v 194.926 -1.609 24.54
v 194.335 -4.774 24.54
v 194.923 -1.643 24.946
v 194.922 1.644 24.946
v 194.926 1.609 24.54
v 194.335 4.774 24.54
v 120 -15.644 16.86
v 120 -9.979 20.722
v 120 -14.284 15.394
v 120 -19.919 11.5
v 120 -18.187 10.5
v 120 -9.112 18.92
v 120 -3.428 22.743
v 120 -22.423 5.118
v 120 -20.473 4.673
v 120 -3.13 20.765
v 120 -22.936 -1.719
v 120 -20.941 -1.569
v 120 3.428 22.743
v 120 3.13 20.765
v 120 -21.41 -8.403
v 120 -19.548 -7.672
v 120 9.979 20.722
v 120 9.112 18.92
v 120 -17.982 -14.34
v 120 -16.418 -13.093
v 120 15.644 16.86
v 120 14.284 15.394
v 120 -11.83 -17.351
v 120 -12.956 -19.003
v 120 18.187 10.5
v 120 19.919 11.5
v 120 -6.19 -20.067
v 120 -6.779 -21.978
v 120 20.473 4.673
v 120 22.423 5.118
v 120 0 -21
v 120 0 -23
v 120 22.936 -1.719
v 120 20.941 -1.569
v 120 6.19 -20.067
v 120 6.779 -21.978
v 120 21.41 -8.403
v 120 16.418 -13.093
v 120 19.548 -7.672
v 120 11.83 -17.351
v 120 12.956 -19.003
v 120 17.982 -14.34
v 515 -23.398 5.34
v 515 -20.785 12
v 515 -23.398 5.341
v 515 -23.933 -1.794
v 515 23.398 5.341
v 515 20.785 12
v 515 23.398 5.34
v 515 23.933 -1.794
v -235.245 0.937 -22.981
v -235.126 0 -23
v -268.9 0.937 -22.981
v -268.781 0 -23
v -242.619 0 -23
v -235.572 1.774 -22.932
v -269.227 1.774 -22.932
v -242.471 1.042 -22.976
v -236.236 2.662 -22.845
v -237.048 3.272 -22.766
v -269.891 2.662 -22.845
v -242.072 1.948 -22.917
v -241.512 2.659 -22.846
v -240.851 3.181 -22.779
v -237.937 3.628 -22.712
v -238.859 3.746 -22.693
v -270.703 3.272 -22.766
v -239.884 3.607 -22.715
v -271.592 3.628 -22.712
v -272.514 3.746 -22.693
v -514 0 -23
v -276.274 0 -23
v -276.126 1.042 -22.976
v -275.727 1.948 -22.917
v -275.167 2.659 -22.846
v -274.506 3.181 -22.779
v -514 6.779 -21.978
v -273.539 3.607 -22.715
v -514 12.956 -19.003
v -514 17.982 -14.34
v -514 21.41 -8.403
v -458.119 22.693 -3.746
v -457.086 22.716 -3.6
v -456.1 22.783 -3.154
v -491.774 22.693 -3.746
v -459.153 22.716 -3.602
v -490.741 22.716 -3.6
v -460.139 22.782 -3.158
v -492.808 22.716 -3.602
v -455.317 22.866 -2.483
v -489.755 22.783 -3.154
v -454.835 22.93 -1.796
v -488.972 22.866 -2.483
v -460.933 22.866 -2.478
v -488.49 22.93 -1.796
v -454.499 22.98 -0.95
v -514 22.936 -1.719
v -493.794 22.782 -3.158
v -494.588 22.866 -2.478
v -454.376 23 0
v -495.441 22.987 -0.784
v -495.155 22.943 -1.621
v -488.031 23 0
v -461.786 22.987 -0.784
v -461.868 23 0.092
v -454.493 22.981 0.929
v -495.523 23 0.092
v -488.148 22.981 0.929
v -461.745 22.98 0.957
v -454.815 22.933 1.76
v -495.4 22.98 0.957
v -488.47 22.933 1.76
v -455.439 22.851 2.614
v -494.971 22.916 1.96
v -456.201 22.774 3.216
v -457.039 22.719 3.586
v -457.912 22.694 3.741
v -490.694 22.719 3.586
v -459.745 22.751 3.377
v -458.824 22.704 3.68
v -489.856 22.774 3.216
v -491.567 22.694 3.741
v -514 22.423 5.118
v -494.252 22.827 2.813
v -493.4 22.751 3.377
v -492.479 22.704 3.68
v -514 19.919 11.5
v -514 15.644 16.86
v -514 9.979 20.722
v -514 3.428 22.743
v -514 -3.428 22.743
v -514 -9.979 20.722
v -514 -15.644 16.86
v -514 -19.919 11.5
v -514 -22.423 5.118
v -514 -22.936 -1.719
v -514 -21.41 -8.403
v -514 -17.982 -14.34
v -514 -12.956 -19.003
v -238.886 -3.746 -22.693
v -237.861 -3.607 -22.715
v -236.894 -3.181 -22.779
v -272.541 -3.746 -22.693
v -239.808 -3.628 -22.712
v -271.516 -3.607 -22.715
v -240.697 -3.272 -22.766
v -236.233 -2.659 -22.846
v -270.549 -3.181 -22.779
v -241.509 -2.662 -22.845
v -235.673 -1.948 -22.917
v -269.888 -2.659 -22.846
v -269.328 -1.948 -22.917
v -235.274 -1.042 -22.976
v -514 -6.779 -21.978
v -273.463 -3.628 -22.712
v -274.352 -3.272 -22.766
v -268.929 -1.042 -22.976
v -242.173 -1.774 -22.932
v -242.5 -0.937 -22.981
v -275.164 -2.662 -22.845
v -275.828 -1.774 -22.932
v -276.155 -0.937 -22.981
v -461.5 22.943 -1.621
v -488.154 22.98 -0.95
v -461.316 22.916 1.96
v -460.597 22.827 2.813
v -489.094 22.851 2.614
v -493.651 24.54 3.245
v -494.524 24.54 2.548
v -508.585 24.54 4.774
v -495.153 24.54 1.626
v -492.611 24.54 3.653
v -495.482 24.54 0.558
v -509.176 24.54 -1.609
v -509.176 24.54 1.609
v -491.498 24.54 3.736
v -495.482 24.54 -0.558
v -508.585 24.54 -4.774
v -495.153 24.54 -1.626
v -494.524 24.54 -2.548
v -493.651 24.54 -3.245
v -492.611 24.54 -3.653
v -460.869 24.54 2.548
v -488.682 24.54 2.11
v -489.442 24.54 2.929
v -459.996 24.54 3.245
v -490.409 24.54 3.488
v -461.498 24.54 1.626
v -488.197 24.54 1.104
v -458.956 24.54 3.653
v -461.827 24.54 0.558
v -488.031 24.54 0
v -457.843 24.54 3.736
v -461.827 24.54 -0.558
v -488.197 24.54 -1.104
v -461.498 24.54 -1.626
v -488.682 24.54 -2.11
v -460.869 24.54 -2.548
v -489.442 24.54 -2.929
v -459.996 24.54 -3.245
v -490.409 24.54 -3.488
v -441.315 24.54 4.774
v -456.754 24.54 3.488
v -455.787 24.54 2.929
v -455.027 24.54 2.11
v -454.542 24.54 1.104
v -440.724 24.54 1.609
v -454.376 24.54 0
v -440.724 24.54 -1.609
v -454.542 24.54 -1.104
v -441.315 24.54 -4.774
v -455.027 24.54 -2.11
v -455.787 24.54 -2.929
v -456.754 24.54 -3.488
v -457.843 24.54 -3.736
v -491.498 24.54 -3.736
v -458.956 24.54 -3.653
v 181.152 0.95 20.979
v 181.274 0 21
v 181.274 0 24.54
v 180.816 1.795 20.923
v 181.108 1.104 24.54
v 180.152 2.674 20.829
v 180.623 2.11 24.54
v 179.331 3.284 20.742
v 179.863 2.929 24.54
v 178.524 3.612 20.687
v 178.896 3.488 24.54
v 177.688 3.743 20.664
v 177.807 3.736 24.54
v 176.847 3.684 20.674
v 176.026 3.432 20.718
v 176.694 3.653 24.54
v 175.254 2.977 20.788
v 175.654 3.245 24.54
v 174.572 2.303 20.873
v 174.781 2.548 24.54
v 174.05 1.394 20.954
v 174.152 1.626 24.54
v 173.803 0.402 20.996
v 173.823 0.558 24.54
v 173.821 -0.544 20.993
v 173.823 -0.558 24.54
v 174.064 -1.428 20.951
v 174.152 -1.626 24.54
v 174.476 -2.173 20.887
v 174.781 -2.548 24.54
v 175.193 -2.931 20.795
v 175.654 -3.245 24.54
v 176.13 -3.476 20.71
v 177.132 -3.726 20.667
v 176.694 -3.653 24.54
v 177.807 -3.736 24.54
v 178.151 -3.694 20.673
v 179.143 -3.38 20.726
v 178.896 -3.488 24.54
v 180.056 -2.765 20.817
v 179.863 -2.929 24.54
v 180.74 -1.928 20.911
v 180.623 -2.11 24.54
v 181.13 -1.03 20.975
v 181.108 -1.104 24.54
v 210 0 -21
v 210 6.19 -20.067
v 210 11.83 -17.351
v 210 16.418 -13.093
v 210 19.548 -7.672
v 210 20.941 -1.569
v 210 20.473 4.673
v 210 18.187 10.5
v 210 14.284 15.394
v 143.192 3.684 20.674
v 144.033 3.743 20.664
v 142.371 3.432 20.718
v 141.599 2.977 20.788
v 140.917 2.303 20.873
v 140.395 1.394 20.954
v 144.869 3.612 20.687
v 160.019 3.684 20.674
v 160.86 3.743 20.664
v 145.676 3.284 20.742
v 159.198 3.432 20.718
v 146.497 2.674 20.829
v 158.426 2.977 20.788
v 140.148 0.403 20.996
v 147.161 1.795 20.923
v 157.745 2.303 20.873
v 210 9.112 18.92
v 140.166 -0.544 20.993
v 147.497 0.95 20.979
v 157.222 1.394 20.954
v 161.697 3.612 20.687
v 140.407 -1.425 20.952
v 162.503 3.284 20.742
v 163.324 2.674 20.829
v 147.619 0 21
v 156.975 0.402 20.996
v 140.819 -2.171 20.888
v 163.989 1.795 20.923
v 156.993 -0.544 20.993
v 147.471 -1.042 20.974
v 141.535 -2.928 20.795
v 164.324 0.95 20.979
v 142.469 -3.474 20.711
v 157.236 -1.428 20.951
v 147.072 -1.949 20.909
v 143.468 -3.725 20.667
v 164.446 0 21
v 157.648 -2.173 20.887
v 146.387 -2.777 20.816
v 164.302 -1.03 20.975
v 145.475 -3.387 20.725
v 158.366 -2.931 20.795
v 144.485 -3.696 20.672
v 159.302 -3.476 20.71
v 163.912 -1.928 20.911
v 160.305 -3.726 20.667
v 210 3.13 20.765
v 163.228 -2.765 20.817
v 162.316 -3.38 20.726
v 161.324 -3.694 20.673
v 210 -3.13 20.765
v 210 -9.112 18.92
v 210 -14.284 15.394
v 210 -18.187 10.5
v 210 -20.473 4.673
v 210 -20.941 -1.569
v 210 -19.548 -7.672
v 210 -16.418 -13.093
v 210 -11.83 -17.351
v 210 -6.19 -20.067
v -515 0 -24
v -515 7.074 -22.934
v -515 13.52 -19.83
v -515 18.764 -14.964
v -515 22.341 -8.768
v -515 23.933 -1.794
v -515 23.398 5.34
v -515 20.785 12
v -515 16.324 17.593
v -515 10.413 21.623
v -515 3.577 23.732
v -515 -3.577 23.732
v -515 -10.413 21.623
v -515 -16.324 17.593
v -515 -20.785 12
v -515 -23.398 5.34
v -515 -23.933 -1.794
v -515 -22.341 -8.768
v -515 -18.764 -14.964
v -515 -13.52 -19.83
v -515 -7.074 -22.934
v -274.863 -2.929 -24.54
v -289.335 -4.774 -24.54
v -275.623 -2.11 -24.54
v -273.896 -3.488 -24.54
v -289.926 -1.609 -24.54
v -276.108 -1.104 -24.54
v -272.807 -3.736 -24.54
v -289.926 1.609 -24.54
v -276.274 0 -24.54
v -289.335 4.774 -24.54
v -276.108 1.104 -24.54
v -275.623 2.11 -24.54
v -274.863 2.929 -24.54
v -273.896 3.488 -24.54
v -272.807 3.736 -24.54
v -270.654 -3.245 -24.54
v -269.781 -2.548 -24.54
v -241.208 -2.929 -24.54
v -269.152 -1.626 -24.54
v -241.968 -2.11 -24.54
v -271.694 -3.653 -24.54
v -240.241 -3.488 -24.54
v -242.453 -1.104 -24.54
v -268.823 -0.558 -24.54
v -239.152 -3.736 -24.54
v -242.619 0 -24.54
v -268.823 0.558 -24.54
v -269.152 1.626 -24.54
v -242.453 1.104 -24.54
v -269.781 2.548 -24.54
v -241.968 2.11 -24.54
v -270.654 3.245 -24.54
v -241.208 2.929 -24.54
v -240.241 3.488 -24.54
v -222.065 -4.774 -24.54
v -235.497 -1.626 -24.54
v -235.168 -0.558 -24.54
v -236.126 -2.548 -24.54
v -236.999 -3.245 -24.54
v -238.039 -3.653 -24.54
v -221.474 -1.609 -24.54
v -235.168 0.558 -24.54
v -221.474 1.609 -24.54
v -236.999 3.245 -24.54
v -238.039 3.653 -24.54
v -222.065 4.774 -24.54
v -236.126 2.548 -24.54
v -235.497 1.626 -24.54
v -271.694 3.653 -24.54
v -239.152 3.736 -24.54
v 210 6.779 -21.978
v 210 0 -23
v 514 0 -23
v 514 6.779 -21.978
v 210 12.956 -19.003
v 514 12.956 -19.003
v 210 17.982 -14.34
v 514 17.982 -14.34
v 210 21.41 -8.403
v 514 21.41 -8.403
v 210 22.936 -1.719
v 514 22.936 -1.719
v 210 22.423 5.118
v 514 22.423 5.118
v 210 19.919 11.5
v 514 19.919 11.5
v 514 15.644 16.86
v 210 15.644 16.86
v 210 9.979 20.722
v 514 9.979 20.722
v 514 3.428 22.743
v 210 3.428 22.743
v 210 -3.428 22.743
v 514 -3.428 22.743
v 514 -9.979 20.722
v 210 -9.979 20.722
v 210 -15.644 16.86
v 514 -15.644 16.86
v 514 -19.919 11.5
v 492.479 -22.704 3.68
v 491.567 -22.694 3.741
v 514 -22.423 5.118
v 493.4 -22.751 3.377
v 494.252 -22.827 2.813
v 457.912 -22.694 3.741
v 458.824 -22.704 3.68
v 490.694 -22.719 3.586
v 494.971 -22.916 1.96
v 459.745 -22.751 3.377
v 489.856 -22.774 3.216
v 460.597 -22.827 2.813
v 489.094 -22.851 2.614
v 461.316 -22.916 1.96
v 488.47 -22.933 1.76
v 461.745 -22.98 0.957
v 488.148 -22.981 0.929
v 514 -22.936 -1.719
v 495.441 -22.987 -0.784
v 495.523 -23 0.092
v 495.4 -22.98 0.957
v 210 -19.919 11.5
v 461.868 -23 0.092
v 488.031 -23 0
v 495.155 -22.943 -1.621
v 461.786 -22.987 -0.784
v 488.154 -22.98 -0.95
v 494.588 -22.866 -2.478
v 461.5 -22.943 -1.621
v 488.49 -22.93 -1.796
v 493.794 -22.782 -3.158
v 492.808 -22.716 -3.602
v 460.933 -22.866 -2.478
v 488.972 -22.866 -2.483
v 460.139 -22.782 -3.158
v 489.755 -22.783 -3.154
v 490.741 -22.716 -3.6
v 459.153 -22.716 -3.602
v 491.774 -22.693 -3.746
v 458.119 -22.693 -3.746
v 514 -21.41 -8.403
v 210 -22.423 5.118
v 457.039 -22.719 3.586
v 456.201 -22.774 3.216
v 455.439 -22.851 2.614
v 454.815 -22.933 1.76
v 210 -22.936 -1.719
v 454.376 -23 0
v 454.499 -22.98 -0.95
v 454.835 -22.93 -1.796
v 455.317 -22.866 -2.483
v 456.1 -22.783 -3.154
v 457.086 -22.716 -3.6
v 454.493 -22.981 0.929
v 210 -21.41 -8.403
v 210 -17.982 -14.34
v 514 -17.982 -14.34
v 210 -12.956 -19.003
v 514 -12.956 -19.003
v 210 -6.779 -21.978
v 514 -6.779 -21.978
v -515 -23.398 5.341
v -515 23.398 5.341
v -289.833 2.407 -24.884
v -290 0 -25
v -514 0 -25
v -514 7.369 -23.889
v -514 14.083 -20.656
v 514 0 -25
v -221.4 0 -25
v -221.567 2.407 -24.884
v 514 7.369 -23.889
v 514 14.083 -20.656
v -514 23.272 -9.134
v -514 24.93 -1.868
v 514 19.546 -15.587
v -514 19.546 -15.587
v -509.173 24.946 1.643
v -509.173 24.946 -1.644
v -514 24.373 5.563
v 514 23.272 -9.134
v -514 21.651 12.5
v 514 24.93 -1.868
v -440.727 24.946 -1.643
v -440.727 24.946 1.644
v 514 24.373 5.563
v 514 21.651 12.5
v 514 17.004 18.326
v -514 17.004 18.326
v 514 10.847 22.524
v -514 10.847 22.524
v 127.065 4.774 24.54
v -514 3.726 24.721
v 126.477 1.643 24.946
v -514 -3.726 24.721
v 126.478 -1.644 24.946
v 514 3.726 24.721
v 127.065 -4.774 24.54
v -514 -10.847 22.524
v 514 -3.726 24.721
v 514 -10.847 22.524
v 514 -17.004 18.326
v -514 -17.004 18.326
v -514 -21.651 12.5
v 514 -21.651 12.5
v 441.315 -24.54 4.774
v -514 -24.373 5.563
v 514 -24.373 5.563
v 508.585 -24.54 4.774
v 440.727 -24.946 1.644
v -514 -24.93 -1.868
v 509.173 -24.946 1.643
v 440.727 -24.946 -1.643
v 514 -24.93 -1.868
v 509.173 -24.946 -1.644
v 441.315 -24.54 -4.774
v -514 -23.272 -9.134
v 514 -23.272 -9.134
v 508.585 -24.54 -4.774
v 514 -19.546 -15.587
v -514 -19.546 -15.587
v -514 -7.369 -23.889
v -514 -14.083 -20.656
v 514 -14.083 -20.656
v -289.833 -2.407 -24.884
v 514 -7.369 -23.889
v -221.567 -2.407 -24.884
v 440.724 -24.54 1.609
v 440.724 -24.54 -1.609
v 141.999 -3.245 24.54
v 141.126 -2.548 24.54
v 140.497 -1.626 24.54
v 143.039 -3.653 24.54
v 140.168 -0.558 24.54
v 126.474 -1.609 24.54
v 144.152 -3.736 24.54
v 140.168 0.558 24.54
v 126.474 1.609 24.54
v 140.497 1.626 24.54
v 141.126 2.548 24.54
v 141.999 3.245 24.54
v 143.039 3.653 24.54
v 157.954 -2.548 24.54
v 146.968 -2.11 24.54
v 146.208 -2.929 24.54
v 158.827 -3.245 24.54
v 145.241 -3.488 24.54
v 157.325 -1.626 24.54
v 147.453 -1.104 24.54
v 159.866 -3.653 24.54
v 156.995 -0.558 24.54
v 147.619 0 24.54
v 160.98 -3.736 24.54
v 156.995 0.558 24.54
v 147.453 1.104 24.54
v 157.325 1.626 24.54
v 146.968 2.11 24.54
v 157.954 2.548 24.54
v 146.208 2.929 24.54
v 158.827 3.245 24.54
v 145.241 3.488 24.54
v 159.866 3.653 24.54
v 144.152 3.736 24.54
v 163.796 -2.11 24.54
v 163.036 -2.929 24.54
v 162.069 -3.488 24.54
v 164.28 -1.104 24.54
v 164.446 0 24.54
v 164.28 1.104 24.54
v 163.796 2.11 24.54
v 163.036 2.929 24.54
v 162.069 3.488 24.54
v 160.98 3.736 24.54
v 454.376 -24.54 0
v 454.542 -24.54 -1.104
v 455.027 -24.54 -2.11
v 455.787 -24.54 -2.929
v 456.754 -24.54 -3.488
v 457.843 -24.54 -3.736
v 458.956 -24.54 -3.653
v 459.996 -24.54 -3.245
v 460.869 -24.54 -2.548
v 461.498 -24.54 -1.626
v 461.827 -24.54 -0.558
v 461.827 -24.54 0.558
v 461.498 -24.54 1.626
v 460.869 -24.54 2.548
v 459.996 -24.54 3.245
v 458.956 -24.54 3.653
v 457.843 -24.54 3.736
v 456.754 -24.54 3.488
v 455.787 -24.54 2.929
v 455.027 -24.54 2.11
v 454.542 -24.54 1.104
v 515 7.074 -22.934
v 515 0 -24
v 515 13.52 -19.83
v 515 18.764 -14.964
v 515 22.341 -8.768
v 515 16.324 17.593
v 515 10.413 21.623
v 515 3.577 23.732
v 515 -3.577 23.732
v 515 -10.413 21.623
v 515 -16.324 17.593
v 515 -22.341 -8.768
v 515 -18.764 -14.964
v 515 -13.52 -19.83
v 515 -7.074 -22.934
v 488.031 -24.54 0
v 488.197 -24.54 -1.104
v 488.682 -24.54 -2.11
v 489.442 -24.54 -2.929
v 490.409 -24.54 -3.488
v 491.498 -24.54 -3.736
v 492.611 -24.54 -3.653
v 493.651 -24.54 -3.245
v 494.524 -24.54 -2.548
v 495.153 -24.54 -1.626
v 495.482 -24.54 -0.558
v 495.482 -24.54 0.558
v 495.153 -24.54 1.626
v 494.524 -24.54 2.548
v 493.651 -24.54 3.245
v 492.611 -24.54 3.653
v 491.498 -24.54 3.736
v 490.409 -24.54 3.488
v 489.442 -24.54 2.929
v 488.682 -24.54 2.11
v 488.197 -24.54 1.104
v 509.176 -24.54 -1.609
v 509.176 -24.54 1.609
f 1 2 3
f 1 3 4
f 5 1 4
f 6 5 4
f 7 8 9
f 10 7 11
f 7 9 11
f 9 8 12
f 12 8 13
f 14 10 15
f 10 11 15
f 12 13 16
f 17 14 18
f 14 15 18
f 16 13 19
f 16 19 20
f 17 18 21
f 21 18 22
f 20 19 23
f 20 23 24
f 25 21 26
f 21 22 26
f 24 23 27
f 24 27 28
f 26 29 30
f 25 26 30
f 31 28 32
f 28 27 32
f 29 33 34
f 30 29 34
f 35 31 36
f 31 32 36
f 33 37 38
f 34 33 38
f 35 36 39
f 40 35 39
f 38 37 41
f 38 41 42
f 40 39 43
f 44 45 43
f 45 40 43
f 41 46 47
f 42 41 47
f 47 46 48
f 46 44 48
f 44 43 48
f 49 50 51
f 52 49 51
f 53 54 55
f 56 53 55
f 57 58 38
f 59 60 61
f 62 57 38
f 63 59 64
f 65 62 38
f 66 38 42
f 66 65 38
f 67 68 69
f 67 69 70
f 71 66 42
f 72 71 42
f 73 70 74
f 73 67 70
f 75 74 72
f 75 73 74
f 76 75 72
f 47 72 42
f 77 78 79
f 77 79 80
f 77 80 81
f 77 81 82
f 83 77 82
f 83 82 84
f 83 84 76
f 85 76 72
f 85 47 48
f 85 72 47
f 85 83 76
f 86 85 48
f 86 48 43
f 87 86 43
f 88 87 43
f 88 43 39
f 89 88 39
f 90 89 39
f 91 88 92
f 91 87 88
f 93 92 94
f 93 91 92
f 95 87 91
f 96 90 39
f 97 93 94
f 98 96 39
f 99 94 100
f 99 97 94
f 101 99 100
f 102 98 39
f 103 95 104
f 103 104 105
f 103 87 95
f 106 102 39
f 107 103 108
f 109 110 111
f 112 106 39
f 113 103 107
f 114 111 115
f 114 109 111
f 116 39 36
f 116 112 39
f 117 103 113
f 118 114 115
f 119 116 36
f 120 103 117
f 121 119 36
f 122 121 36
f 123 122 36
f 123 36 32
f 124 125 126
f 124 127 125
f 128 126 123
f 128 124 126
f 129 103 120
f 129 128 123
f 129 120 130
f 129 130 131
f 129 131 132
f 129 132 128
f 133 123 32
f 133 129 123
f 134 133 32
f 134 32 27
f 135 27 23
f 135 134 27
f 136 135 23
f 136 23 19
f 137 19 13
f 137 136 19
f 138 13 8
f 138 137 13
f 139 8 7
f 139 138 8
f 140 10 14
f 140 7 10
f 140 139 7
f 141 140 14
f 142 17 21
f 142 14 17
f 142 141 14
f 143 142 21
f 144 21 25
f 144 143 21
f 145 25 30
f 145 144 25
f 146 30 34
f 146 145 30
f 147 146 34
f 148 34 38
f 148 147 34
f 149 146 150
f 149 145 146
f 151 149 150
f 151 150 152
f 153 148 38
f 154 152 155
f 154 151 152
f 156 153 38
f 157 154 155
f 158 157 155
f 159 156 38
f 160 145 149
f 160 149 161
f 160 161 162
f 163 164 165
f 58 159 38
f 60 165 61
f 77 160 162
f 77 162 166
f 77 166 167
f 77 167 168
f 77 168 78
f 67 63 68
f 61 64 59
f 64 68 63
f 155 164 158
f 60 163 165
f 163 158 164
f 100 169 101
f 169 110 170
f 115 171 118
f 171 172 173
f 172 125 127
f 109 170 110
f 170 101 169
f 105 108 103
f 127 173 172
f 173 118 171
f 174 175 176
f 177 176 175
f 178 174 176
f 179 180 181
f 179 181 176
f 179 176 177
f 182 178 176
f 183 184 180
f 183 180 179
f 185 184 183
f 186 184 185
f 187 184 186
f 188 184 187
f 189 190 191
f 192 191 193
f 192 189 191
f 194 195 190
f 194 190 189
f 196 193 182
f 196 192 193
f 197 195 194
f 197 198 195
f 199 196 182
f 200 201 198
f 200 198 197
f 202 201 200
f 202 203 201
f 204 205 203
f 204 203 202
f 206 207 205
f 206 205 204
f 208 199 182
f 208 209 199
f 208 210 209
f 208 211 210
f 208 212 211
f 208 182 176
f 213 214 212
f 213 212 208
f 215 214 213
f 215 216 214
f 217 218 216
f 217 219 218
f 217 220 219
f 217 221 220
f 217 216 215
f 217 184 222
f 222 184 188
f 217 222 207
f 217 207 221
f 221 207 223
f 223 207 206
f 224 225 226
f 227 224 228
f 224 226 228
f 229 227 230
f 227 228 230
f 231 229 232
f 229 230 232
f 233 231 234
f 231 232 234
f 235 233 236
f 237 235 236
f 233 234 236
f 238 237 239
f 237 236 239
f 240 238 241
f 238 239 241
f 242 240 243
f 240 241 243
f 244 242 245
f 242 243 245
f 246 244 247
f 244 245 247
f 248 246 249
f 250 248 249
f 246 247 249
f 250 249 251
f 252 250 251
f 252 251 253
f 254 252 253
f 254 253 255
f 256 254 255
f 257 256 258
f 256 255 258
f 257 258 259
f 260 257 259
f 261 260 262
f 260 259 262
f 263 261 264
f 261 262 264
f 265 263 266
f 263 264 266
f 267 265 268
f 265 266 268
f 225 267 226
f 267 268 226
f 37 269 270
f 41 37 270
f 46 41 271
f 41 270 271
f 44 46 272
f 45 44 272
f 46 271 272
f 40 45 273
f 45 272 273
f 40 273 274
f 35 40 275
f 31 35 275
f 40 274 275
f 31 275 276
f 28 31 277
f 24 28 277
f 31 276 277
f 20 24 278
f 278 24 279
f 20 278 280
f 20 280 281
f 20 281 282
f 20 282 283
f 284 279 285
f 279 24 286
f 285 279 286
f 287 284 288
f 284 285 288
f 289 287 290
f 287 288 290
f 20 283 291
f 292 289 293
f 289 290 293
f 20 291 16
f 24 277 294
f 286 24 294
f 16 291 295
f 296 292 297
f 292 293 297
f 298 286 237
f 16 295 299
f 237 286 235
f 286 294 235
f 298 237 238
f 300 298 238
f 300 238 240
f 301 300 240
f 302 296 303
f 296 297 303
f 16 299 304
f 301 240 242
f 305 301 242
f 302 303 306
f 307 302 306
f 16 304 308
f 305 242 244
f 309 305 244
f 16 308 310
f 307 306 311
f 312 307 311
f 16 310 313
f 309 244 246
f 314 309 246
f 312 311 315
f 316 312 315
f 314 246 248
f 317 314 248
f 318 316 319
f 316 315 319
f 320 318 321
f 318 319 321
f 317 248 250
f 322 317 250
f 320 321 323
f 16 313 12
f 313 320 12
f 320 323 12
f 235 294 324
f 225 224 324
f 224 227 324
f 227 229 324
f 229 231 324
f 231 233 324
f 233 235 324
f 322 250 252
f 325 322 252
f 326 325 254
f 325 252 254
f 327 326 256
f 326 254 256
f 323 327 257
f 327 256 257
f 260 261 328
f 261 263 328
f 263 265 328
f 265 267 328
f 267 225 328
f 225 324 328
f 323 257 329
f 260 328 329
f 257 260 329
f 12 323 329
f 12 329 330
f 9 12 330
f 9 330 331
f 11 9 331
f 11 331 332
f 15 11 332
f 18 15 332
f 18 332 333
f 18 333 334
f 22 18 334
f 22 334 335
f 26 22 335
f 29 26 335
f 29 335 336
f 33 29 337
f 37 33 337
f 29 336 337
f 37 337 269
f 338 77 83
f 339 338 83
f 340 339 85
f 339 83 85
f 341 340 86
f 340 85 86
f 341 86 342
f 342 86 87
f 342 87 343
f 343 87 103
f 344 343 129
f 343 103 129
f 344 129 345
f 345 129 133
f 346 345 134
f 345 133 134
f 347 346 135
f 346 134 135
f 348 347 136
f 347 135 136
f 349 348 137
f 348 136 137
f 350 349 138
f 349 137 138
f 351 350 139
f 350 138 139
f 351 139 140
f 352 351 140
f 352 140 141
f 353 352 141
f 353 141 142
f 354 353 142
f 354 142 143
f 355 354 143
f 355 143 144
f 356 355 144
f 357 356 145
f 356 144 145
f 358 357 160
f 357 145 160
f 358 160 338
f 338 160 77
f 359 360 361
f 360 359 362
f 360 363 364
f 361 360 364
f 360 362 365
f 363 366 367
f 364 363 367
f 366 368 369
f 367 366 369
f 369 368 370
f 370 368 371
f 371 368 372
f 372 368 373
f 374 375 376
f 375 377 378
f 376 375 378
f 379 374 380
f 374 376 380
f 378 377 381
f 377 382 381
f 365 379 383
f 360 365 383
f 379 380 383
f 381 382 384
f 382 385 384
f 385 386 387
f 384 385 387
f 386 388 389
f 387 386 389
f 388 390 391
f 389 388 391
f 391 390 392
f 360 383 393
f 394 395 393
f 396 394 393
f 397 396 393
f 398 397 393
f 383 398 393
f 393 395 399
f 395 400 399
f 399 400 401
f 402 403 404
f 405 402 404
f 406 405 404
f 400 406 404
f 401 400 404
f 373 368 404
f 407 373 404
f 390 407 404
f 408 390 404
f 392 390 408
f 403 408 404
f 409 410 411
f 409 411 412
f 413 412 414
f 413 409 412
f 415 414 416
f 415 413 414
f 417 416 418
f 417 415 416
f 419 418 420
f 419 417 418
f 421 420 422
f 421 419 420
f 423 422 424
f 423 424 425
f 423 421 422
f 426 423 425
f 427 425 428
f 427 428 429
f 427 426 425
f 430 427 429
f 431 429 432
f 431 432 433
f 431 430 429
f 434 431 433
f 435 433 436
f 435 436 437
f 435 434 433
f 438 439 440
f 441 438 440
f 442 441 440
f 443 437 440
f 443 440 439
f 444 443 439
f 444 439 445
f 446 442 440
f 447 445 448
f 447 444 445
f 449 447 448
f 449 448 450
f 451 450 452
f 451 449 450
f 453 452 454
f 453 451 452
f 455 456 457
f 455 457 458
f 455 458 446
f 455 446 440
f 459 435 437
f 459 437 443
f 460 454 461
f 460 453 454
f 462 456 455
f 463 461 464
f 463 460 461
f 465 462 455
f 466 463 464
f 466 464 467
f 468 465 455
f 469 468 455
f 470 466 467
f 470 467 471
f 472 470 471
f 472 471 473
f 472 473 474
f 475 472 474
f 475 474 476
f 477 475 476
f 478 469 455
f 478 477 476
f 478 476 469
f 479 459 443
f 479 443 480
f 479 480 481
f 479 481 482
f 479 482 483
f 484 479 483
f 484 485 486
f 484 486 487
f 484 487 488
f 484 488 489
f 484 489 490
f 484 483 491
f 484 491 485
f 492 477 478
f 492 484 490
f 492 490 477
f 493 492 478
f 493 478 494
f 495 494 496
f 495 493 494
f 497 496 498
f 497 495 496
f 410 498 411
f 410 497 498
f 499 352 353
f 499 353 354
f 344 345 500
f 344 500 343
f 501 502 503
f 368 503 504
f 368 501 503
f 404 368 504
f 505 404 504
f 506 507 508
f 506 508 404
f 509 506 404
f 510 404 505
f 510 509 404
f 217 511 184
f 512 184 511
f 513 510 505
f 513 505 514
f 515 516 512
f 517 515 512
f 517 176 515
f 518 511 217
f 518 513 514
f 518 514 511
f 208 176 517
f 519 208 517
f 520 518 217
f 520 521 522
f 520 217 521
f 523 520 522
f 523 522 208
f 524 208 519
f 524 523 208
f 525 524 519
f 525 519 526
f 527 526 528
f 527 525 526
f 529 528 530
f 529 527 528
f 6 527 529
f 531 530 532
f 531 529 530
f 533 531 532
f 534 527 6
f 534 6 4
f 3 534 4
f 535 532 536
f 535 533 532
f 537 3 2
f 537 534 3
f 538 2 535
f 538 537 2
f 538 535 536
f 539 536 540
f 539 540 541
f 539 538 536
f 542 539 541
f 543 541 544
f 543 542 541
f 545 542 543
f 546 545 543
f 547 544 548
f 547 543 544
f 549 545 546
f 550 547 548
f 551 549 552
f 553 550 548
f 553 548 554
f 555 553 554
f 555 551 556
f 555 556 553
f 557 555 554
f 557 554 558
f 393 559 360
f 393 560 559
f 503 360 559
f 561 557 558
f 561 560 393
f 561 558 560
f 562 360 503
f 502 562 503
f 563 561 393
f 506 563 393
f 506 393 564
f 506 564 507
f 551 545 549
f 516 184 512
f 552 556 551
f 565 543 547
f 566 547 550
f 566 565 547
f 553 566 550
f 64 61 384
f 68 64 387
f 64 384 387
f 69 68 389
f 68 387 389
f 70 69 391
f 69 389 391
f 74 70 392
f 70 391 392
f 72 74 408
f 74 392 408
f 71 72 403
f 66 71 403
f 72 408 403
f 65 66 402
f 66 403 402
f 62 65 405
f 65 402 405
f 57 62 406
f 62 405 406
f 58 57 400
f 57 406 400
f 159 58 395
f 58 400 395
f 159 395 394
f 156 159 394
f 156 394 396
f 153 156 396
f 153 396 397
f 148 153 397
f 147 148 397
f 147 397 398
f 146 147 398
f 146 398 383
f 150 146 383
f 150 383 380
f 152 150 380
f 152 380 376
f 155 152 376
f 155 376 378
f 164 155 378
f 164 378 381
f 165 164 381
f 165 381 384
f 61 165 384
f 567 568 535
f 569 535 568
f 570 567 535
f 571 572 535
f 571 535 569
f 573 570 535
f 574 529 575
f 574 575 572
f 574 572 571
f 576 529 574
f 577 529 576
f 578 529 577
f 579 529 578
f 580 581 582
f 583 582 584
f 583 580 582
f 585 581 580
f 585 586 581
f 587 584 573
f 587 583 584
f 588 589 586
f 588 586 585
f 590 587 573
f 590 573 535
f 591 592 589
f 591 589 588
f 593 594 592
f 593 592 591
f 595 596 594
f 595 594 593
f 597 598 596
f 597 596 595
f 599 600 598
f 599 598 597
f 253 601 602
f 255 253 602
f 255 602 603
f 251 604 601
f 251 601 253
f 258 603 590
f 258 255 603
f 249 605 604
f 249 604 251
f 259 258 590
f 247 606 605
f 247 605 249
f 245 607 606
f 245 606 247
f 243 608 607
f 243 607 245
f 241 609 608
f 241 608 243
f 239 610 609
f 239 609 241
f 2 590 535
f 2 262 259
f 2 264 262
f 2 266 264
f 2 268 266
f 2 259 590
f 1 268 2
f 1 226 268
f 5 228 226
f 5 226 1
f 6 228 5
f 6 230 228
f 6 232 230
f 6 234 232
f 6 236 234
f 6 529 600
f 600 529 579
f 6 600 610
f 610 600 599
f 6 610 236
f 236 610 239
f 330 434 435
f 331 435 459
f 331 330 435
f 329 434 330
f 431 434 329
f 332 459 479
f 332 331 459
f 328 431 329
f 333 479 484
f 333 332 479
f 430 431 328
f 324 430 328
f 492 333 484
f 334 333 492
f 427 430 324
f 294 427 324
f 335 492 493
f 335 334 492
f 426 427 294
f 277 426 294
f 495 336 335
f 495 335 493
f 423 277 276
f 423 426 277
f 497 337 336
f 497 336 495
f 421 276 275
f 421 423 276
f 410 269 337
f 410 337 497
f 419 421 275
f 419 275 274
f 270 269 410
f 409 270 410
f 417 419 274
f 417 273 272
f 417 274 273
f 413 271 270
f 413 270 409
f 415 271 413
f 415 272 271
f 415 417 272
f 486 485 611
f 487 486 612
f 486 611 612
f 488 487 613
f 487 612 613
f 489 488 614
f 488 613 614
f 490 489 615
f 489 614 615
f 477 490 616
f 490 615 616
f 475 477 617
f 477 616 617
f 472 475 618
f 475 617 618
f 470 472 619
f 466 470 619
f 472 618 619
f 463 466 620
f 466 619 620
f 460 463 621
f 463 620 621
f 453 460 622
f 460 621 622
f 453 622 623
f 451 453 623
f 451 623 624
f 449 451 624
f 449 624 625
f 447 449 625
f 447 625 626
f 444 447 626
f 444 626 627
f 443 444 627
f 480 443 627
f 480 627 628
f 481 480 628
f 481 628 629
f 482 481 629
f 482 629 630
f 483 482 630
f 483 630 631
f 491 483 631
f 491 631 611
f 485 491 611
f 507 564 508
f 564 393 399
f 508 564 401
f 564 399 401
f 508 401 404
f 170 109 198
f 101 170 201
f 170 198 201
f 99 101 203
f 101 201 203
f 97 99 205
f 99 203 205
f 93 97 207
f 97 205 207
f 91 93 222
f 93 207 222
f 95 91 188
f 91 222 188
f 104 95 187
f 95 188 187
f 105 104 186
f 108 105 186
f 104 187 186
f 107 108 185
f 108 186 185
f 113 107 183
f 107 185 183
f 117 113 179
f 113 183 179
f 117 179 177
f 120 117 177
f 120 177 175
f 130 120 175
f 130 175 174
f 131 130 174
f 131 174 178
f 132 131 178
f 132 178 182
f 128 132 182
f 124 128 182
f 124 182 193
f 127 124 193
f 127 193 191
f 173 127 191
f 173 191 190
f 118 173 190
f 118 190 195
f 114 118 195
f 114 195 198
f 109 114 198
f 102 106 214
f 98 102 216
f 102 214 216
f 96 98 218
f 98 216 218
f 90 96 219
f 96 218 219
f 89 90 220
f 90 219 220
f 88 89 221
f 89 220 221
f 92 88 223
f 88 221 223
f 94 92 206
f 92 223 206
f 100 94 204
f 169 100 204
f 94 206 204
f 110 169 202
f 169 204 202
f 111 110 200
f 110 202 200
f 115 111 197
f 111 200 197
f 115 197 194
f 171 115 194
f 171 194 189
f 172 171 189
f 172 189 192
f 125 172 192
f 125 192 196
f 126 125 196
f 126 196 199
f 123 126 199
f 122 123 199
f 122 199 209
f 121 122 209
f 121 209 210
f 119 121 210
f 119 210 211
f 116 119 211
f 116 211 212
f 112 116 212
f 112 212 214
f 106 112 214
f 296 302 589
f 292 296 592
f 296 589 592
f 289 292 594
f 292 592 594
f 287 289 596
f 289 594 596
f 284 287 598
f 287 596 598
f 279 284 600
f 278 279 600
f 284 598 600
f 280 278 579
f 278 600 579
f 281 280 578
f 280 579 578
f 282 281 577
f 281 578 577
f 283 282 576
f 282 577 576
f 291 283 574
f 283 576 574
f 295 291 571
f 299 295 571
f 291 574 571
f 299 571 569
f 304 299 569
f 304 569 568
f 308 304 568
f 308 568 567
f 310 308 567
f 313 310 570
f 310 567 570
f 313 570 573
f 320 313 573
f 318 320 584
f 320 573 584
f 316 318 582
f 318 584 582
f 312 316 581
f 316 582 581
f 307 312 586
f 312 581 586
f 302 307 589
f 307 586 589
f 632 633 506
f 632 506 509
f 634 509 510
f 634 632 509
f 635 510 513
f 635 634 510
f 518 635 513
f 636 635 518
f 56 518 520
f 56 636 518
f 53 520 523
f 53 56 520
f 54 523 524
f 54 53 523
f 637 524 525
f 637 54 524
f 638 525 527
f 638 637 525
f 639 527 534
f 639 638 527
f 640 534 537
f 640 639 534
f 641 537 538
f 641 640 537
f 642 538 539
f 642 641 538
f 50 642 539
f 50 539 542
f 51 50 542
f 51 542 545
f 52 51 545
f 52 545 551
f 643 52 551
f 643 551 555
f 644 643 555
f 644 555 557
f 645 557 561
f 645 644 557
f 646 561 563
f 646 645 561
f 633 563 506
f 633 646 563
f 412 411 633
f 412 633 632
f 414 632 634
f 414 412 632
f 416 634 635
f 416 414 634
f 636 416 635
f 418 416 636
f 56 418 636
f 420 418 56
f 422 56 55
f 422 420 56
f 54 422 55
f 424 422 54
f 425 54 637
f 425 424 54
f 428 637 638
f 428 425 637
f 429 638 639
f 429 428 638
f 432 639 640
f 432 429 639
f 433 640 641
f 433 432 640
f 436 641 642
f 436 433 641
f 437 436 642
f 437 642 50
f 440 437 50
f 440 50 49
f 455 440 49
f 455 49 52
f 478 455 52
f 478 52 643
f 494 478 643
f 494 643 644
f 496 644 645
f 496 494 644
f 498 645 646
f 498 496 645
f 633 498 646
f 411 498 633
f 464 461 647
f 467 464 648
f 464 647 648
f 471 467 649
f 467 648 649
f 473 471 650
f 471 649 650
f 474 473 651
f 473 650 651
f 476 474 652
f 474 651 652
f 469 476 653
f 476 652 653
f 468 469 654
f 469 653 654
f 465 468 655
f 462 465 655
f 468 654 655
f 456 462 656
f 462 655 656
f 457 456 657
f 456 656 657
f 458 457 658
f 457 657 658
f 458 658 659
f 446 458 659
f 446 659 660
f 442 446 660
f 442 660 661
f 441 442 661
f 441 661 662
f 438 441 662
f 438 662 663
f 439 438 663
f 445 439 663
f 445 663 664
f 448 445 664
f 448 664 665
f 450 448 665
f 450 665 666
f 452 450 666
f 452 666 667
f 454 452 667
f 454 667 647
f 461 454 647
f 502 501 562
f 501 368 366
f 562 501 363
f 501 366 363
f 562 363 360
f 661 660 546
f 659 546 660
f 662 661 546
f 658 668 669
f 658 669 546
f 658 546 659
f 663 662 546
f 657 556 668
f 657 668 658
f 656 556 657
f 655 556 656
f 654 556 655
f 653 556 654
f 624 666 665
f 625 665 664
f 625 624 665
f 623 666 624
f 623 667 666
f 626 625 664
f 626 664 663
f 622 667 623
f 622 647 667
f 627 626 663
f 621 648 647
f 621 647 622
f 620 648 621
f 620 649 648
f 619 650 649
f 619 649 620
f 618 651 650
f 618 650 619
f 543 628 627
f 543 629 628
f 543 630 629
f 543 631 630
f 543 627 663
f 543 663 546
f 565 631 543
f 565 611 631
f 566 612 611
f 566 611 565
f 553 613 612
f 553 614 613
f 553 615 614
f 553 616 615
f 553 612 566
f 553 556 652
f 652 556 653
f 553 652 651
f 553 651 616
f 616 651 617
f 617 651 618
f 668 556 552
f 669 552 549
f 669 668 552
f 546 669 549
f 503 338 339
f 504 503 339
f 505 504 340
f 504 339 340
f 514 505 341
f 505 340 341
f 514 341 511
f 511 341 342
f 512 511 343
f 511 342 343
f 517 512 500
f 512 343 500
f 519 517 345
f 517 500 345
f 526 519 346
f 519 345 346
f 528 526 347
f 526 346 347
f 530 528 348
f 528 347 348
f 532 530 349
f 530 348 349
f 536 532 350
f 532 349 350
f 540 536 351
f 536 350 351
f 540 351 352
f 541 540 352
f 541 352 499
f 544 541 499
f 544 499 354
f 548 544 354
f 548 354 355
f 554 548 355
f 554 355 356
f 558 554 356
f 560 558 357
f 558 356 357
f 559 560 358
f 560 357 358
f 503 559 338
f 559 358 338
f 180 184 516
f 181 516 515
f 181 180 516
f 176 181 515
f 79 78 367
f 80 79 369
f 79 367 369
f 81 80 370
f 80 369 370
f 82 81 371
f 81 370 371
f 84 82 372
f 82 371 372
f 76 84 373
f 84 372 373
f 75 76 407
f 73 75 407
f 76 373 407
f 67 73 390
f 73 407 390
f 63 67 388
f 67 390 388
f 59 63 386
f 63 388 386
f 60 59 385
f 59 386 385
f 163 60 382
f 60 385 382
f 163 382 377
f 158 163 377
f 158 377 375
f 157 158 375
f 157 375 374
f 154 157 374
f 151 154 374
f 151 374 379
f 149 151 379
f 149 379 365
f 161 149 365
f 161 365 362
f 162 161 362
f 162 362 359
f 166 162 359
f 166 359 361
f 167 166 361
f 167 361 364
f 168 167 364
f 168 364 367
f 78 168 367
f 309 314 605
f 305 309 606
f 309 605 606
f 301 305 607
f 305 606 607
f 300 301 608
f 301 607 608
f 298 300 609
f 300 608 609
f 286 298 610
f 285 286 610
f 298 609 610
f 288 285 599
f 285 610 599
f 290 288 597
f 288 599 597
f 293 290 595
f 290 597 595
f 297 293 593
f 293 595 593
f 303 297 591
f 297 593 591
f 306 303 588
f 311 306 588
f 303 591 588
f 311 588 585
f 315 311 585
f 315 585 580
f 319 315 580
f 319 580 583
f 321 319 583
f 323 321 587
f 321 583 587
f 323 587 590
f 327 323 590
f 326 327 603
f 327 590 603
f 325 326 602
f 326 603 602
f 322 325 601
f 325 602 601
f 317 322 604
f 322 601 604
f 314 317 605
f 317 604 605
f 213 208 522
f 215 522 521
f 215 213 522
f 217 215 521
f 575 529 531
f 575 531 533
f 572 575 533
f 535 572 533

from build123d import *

# Parameters (mm, degrees)
SKETCH1_R                     = 25
SKETCH1_R_2                   = 23
EXTRUDE_THIN1_DEPTH           = 515
EXTRUDE_THIN2_START           = 210
SKETCH1_3_R                   = 25
SKETCH1_3_R_2                 = 21
EXTRUDE_THIN2_DEPTH           = 90
CUT_EXTRUDE1_START            = 24.54
CUT_EXTRUDE1_DEPTH            = 492.672165684
CUT_EXTRUDE2_START            = -24.54
CUT_EXTRUDE2_DEPTH            = 492.672165793
CUT_EXTRUDE3_START            = -24.54
CUT_EXTRUDE3_DEPTH            = 492.672165793
CUT_EXTRUDE4_START            = 24.54
CUT_EXTRUDE4_DEPTH            = 492.672165793
M_0_295_DIAMETER_HOLE3_REACH  = 519.981
M_0_295_DIAMETER_HOLE3_BORE_R = 3.7465
M_0_295_DIAMETER_HOLE4_REACH  = 519.981
M_0_295_DIAMETER_HOLE4_BORE_R = 3.7465
M_0_295_DIAMETER_HOLE5_REACH  = 519.981
M_0_295_DIAMETER_HOLE5_BORE_R = 3.7465
M_0_295_DIAMETER_HOLE6_REACH  = 519.981
M_0_295_DIAMETER_HOLE6_BORE_R = 3.7465
CHAMFER1_SIZE                 = 1


with BuildPart() as part:
    # Sketch1 → Extrude-Thin1 (new, symmetric)
    with BuildSketch(Plane(origin=(0, 0, 0), x_dir=(0, 0, -1), z_dir=(1, 0, 0))):
        Circle(SKETCH1_R)
        Circle(SKETCH1_R_2, mode=Mode.SUBTRACT)
    extrude(amount=EXTRUDE_THIN1_DEPTH, both=True)

    # Sketch1<3> → Extrude-Thin2 (add)
    with BuildSketch(Plane(origin=(0, 0, 0), x_dir=(0, 0, -1), z_dir=(1, 0, 0)).offset(EXTRUDE_THIN2_START)):
        Circle(SKETCH1_3_R)
        Circle(SKETCH1_3_R_2, mode=Mode.SUBTRACT)
    extrude(amount=-EXTRUDE_THIN2_DEPTH)

    # Sketch3 → Cut-Extrude1 (cut, through all)
    with BuildSketch(Plane(origin=(0, 0, 0), x_dir=(1, 0, 0), z_dir=(0, 1, 0)).offset(CUT_EXTRUDE1_START)):
        with BuildLine():
            Line((-491.7775, -17.4725), (-458.1225, -17.4725))
            ThreePointArc((-458.1225, -17.4725), (-440.65, 0), (-458.1225, 17.4725))
            Line((-458.1225, 17.4725), (-491.7775, 17.4725))
            ThreePointArc((-491.7775, 17.4725), (-509.25, 0), (-491.7775, -17.4725))
        make_face()
    extrude(amount=CUT_EXTRUDE1_DEPTH, mode=Mode.SUBTRACT)

    # Sketch8 → Cut-Extrude2 (cut, through all)
    with BuildSketch(Plane.XY.offset(CUT_EXTRUDE2_START)):
        with BuildLine():
            Line((-272.5275, -17.4725), (-238.8725, -17.4725))
            ThreePointArc((-238.8725, -17.4725), (-221.4, 0), (-238.8725, 17.4725))
            Line((-238.8725, 17.4725), (-272.5275, 17.4725))
            ThreePointArc((-272.5275, 17.4725), (-290, 0), (-272.5275, -17.4725))
        make_face()
    extrude(amount=-CUT_EXTRUDE2_DEPTH, mode=Mode.SUBTRACT)

    # Sketch3<3> → Cut-Extrude3 (cut, through all)
    with BuildSketch(Plane(origin=(0, 0, 0), x_dir=(1, 0, 0), z_dir=(0, 1, 0)).offset(CUT_EXTRUDE3_START)):
        with BuildLine():
            ThreePointArc((458.1225, -17.4725), (440.65, 0), (458.1225, 17.4725))
            Line((458.1225, 17.4725), (491.7775, 17.4725))
            ThreePointArc((491.7775, 17.4725), (509.25, 0), (491.7775, -17.4725))
            Line((491.7775, -17.4725), (458.1225, -17.4725))
        make_face()
    extrude(amount=-CUT_EXTRUDE3_DEPTH, mode=Mode.SUBTRACT)

    # Sketch8<4> → Cut-Extrude4 (cut, through all)
    with BuildSketch(Plane.XY.offset(CUT_EXTRUDE4_START)):
        with BuildLine():
            Line((143.8725, -17.4725), (177.5275, -17.4725))
            ThreePointArc((177.5275, -17.4725), (195, 0), (177.5275, 17.4725))
            Line((177.5275, 17.4725), (143.8725, 17.4725))
            ThreePointArc((143.8725, 17.4725), (126.4, 0), (143.8725, -17.4725))
        make_face()
    extrude(amount=CUT_EXTRUDE4_DEPTH, mode=Mode.SUBTRACT)

    # M (0.295) Diameter Hole3 bore → M (0.295) Diameter Hole3 (cut, up to next)
    with BuildSketch(Plane(origin=(0, 24.54, 0), x_dir=(1, 0, 0), z_dir=(0, 1, 0)), mode=Mode.PRIVATE) as m_0_295_diameter_hole3_sk1:
        with Locations((-491.7775, 0)):
            Circle(M_0_295_DIAMETER_HOLE3_BORE_R)
    m_0_295_diameter_hole3_tool1 = extrude(m_0_295_diameter_hole3_sk1.sketch, amount=-M_0_295_DIAMETER_HOLE3_REACH, mode=Mode.PRIVATE) & part.part
    # M (0.295) Diameter Hole3 bore → M (0.295) Diameter Hole3 (cut, up to next)
    with BuildSketch(Plane(origin=(0, 24.54, 0), x_dir=(1, 0, 0), z_dir=(0, 1, 0)), mode=Mode.PRIVATE) as m_0_295_diameter_hole3_sk2:
        with Locations((-458.1225, 0)):
            Circle(M_0_295_DIAMETER_HOLE3_BORE_R)
    m_0_295_diameter_hole3_tool2 = extrude(m_0_295_diameter_hole3_sk2.sketch, amount=-M_0_295_DIAMETER_HOLE3_REACH, mode=Mode.PRIVATE) & part.part
    add(m_0_295_diameter_hole3_tool1.solids().sort_by_distance((-491.7775, 24.54, 0))[0], mode=Mode.SUBTRACT)
    add(m_0_295_diameter_hole3_tool2.solids().sort_by_distance((-458.1225, 24.54, 0))[0], mode=Mode.SUBTRACT)

    # M (0.295) Diameter Hole4 bore → M (0.295) Diameter Hole4 (cut, up to next)
    with BuildSketch(Plane(origin=(0, 0, -24.54), x_dir=(-1, 0, 0), z_dir=(0, 0, -1)), mode=Mode.PRIVATE) as m_0_295_diameter_hole4_sk1:
        with Locations((238.8725, 0)):
            Circle(M_0_295_DIAMETER_HOLE4_BORE_R)
    m_0_295_diameter_hole4_tool1 = extrude(m_0_295_diameter_hole4_sk1.sketch, amount=-M_0_295_DIAMETER_HOLE4_REACH, mode=Mode.PRIVATE) & part.part
    # M (0.295) Diameter Hole4 bore → M (0.295) Diameter Hole4 (cut, up to next)
    with BuildSketch(Plane(origin=(0, 0, -24.54), x_dir=(-1, 0, 0), z_dir=(0, 0, -1)), mode=Mode.PRIVATE) as m_0_295_diameter_hole4_sk2:
        with Locations((272.5275, 0)):
            Circle(M_0_295_DIAMETER_HOLE4_BORE_R)
    m_0_295_diameter_hole4_tool2 = extrude(m_0_295_diameter_hole4_sk2.sketch, amount=-M_0_295_DIAMETER_HOLE4_REACH, mode=Mode.PRIVATE) & part.part
    add(m_0_295_diameter_hole4_tool1.solids().sort_by_distance((-238.8725, 0, -24.54))[0], mode=Mode.SUBTRACT)
    add(m_0_295_diameter_hole4_tool2.solids().sort_by_distance((-272.5275, 0, -24.54))[0], mode=Mode.SUBTRACT)

    # M (0.295) Diameter Hole5 bore → M (0.295) Diameter Hole5 (cut, up to next)
    with BuildSketch(Plane.XY.offset(24.54), mode=Mode.PRIVATE) as m_0_295_diameter_hole5_sk1:
        with Locations((143.8725, 0)):
            Circle(M_0_295_DIAMETER_HOLE5_BORE_R)
    m_0_295_diameter_hole5_tool1 = extrude(m_0_295_diameter_hole5_sk1.sketch, amount=-M_0_295_DIAMETER_HOLE5_REACH, mode=Mode.PRIVATE) & part.part
    # M (0.295) Diameter Hole5 bore → M (0.295) Diameter Hole5 (cut, up to next)
    with BuildSketch(Plane.XY.offset(24.54), mode=Mode.PRIVATE) as m_0_295_diameter_hole5_sk2:
        with Locations((160.7, 0)):
            Circle(M_0_295_DIAMETER_HOLE5_BORE_R)
    m_0_295_diameter_hole5_tool2 = extrude(m_0_295_diameter_hole5_sk2.sketch, amount=-M_0_295_DIAMETER_HOLE5_REACH, mode=Mode.PRIVATE) & part.part
    # M (0.295) Diameter Hole5 bore → M (0.295) Diameter Hole5 (cut, up to next)
    with BuildSketch(Plane.XY.offset(24.54), mode=Mode.PRIVATE) as m_0_295_diameter_hole5_sk3:
        with Locations((177.5275, 0)):
            Circle(M_0_295_DIAMETER_HOLE5_BORE_R)
    m_0_295_diameter_hole5_tool3 = extrude(m_0_295_diameter_hole5_sk3.sketch, amount=-M_0_295_DIAMETER_HOLE5_REACH, mode=Mode.PRIVATE) & part.part
    add(m_0_295_diameter_hole5_tool1.solids().sort_by_distance((143.8725, 0, 24.54))[0], mode=Mode.SUBTRACT)
    add(m_0_295_diameter_hole5_tool2.solids().sort_by_distance((160.7, 0, 24.54))[0], mode=Mode.SUBTRACT)
    add(m_0_295_diameter_hole5_tool3.solids().sort_by_distance((177.5275, 0, 24.54))[0], mode=Mode.SUBTRACT)

    # M (0.295) Diameter Hole6 bore → M (0.295) Diameter Hole6 (cut, up to next)
    with BuildSketch(Plane(origin=(0, -24.54, 0), x_dir=(-1, 0, 0), z_dir=(0, -1, 0)), mode=Mode.PRIVATE) as m_0_295_diameter_hole6_sk1:
        with Locations((-491.7775, 0)):
            Circle(M_0_295_DIAMETER_HOLE6_BORE_R)
    m_0_295_diameter_hole6_tool1 = extrude(m_0_295_diameter_hole6_sk1.sketch, amount=-M_0_295_DIAMETER_HOLE6_REACH, mode=Mode.PRIVATE) & part.part
    # M (0.295) Diameter Hole6 bore → M (0.295) Diameter Hole6 (cut, up to next)
    with BuildSketch(Plane(origin=(0, -24.54, 0), x_dir=(-1, 0, 0), z_dir=(0, -1, 0)), mode=Mode.PRIVATE) as m_0_295_diameter_hole6_sk2:
        with Locations((-458.1225, 0)):
            Circle(M_0_295_DIAMETER_HOLE6_BORE_R)
    m_0_295_diameter_hole6_tool2 = extrude(m_0_295_diameter_hole6_sk2.sketch, amount=-M_0_295_DIAMETER_HOLE6_REACH, mode=Mode.PRIVATE) & part.part
    add(m_0_295_diameter_hole6_tool1.solids().sort_by_distance((491.7775, -24.54, 0))[0], mode=Mode.SUBTRACT)
    add(m_0_295_diameter_hole6_tool2.solids().sort_by_distance((458.1225, -24.54, 0))[0], mode=Mode.SUBTRACT)

    # Chamfer1
    chamfer1_edges = [part.edges().sort_by_distance(p)[0] for p in [
        (-515, 0, 25),
        (-515, 0, 23),
        (515, 0, 25),
        (515, 0, 23),
    ]]
    chamfer(chamfer1_edges, length=CHAMFER1_SIZE - 0.0001)  # a hair under: the kernel refuses the full size


solid = part.part
